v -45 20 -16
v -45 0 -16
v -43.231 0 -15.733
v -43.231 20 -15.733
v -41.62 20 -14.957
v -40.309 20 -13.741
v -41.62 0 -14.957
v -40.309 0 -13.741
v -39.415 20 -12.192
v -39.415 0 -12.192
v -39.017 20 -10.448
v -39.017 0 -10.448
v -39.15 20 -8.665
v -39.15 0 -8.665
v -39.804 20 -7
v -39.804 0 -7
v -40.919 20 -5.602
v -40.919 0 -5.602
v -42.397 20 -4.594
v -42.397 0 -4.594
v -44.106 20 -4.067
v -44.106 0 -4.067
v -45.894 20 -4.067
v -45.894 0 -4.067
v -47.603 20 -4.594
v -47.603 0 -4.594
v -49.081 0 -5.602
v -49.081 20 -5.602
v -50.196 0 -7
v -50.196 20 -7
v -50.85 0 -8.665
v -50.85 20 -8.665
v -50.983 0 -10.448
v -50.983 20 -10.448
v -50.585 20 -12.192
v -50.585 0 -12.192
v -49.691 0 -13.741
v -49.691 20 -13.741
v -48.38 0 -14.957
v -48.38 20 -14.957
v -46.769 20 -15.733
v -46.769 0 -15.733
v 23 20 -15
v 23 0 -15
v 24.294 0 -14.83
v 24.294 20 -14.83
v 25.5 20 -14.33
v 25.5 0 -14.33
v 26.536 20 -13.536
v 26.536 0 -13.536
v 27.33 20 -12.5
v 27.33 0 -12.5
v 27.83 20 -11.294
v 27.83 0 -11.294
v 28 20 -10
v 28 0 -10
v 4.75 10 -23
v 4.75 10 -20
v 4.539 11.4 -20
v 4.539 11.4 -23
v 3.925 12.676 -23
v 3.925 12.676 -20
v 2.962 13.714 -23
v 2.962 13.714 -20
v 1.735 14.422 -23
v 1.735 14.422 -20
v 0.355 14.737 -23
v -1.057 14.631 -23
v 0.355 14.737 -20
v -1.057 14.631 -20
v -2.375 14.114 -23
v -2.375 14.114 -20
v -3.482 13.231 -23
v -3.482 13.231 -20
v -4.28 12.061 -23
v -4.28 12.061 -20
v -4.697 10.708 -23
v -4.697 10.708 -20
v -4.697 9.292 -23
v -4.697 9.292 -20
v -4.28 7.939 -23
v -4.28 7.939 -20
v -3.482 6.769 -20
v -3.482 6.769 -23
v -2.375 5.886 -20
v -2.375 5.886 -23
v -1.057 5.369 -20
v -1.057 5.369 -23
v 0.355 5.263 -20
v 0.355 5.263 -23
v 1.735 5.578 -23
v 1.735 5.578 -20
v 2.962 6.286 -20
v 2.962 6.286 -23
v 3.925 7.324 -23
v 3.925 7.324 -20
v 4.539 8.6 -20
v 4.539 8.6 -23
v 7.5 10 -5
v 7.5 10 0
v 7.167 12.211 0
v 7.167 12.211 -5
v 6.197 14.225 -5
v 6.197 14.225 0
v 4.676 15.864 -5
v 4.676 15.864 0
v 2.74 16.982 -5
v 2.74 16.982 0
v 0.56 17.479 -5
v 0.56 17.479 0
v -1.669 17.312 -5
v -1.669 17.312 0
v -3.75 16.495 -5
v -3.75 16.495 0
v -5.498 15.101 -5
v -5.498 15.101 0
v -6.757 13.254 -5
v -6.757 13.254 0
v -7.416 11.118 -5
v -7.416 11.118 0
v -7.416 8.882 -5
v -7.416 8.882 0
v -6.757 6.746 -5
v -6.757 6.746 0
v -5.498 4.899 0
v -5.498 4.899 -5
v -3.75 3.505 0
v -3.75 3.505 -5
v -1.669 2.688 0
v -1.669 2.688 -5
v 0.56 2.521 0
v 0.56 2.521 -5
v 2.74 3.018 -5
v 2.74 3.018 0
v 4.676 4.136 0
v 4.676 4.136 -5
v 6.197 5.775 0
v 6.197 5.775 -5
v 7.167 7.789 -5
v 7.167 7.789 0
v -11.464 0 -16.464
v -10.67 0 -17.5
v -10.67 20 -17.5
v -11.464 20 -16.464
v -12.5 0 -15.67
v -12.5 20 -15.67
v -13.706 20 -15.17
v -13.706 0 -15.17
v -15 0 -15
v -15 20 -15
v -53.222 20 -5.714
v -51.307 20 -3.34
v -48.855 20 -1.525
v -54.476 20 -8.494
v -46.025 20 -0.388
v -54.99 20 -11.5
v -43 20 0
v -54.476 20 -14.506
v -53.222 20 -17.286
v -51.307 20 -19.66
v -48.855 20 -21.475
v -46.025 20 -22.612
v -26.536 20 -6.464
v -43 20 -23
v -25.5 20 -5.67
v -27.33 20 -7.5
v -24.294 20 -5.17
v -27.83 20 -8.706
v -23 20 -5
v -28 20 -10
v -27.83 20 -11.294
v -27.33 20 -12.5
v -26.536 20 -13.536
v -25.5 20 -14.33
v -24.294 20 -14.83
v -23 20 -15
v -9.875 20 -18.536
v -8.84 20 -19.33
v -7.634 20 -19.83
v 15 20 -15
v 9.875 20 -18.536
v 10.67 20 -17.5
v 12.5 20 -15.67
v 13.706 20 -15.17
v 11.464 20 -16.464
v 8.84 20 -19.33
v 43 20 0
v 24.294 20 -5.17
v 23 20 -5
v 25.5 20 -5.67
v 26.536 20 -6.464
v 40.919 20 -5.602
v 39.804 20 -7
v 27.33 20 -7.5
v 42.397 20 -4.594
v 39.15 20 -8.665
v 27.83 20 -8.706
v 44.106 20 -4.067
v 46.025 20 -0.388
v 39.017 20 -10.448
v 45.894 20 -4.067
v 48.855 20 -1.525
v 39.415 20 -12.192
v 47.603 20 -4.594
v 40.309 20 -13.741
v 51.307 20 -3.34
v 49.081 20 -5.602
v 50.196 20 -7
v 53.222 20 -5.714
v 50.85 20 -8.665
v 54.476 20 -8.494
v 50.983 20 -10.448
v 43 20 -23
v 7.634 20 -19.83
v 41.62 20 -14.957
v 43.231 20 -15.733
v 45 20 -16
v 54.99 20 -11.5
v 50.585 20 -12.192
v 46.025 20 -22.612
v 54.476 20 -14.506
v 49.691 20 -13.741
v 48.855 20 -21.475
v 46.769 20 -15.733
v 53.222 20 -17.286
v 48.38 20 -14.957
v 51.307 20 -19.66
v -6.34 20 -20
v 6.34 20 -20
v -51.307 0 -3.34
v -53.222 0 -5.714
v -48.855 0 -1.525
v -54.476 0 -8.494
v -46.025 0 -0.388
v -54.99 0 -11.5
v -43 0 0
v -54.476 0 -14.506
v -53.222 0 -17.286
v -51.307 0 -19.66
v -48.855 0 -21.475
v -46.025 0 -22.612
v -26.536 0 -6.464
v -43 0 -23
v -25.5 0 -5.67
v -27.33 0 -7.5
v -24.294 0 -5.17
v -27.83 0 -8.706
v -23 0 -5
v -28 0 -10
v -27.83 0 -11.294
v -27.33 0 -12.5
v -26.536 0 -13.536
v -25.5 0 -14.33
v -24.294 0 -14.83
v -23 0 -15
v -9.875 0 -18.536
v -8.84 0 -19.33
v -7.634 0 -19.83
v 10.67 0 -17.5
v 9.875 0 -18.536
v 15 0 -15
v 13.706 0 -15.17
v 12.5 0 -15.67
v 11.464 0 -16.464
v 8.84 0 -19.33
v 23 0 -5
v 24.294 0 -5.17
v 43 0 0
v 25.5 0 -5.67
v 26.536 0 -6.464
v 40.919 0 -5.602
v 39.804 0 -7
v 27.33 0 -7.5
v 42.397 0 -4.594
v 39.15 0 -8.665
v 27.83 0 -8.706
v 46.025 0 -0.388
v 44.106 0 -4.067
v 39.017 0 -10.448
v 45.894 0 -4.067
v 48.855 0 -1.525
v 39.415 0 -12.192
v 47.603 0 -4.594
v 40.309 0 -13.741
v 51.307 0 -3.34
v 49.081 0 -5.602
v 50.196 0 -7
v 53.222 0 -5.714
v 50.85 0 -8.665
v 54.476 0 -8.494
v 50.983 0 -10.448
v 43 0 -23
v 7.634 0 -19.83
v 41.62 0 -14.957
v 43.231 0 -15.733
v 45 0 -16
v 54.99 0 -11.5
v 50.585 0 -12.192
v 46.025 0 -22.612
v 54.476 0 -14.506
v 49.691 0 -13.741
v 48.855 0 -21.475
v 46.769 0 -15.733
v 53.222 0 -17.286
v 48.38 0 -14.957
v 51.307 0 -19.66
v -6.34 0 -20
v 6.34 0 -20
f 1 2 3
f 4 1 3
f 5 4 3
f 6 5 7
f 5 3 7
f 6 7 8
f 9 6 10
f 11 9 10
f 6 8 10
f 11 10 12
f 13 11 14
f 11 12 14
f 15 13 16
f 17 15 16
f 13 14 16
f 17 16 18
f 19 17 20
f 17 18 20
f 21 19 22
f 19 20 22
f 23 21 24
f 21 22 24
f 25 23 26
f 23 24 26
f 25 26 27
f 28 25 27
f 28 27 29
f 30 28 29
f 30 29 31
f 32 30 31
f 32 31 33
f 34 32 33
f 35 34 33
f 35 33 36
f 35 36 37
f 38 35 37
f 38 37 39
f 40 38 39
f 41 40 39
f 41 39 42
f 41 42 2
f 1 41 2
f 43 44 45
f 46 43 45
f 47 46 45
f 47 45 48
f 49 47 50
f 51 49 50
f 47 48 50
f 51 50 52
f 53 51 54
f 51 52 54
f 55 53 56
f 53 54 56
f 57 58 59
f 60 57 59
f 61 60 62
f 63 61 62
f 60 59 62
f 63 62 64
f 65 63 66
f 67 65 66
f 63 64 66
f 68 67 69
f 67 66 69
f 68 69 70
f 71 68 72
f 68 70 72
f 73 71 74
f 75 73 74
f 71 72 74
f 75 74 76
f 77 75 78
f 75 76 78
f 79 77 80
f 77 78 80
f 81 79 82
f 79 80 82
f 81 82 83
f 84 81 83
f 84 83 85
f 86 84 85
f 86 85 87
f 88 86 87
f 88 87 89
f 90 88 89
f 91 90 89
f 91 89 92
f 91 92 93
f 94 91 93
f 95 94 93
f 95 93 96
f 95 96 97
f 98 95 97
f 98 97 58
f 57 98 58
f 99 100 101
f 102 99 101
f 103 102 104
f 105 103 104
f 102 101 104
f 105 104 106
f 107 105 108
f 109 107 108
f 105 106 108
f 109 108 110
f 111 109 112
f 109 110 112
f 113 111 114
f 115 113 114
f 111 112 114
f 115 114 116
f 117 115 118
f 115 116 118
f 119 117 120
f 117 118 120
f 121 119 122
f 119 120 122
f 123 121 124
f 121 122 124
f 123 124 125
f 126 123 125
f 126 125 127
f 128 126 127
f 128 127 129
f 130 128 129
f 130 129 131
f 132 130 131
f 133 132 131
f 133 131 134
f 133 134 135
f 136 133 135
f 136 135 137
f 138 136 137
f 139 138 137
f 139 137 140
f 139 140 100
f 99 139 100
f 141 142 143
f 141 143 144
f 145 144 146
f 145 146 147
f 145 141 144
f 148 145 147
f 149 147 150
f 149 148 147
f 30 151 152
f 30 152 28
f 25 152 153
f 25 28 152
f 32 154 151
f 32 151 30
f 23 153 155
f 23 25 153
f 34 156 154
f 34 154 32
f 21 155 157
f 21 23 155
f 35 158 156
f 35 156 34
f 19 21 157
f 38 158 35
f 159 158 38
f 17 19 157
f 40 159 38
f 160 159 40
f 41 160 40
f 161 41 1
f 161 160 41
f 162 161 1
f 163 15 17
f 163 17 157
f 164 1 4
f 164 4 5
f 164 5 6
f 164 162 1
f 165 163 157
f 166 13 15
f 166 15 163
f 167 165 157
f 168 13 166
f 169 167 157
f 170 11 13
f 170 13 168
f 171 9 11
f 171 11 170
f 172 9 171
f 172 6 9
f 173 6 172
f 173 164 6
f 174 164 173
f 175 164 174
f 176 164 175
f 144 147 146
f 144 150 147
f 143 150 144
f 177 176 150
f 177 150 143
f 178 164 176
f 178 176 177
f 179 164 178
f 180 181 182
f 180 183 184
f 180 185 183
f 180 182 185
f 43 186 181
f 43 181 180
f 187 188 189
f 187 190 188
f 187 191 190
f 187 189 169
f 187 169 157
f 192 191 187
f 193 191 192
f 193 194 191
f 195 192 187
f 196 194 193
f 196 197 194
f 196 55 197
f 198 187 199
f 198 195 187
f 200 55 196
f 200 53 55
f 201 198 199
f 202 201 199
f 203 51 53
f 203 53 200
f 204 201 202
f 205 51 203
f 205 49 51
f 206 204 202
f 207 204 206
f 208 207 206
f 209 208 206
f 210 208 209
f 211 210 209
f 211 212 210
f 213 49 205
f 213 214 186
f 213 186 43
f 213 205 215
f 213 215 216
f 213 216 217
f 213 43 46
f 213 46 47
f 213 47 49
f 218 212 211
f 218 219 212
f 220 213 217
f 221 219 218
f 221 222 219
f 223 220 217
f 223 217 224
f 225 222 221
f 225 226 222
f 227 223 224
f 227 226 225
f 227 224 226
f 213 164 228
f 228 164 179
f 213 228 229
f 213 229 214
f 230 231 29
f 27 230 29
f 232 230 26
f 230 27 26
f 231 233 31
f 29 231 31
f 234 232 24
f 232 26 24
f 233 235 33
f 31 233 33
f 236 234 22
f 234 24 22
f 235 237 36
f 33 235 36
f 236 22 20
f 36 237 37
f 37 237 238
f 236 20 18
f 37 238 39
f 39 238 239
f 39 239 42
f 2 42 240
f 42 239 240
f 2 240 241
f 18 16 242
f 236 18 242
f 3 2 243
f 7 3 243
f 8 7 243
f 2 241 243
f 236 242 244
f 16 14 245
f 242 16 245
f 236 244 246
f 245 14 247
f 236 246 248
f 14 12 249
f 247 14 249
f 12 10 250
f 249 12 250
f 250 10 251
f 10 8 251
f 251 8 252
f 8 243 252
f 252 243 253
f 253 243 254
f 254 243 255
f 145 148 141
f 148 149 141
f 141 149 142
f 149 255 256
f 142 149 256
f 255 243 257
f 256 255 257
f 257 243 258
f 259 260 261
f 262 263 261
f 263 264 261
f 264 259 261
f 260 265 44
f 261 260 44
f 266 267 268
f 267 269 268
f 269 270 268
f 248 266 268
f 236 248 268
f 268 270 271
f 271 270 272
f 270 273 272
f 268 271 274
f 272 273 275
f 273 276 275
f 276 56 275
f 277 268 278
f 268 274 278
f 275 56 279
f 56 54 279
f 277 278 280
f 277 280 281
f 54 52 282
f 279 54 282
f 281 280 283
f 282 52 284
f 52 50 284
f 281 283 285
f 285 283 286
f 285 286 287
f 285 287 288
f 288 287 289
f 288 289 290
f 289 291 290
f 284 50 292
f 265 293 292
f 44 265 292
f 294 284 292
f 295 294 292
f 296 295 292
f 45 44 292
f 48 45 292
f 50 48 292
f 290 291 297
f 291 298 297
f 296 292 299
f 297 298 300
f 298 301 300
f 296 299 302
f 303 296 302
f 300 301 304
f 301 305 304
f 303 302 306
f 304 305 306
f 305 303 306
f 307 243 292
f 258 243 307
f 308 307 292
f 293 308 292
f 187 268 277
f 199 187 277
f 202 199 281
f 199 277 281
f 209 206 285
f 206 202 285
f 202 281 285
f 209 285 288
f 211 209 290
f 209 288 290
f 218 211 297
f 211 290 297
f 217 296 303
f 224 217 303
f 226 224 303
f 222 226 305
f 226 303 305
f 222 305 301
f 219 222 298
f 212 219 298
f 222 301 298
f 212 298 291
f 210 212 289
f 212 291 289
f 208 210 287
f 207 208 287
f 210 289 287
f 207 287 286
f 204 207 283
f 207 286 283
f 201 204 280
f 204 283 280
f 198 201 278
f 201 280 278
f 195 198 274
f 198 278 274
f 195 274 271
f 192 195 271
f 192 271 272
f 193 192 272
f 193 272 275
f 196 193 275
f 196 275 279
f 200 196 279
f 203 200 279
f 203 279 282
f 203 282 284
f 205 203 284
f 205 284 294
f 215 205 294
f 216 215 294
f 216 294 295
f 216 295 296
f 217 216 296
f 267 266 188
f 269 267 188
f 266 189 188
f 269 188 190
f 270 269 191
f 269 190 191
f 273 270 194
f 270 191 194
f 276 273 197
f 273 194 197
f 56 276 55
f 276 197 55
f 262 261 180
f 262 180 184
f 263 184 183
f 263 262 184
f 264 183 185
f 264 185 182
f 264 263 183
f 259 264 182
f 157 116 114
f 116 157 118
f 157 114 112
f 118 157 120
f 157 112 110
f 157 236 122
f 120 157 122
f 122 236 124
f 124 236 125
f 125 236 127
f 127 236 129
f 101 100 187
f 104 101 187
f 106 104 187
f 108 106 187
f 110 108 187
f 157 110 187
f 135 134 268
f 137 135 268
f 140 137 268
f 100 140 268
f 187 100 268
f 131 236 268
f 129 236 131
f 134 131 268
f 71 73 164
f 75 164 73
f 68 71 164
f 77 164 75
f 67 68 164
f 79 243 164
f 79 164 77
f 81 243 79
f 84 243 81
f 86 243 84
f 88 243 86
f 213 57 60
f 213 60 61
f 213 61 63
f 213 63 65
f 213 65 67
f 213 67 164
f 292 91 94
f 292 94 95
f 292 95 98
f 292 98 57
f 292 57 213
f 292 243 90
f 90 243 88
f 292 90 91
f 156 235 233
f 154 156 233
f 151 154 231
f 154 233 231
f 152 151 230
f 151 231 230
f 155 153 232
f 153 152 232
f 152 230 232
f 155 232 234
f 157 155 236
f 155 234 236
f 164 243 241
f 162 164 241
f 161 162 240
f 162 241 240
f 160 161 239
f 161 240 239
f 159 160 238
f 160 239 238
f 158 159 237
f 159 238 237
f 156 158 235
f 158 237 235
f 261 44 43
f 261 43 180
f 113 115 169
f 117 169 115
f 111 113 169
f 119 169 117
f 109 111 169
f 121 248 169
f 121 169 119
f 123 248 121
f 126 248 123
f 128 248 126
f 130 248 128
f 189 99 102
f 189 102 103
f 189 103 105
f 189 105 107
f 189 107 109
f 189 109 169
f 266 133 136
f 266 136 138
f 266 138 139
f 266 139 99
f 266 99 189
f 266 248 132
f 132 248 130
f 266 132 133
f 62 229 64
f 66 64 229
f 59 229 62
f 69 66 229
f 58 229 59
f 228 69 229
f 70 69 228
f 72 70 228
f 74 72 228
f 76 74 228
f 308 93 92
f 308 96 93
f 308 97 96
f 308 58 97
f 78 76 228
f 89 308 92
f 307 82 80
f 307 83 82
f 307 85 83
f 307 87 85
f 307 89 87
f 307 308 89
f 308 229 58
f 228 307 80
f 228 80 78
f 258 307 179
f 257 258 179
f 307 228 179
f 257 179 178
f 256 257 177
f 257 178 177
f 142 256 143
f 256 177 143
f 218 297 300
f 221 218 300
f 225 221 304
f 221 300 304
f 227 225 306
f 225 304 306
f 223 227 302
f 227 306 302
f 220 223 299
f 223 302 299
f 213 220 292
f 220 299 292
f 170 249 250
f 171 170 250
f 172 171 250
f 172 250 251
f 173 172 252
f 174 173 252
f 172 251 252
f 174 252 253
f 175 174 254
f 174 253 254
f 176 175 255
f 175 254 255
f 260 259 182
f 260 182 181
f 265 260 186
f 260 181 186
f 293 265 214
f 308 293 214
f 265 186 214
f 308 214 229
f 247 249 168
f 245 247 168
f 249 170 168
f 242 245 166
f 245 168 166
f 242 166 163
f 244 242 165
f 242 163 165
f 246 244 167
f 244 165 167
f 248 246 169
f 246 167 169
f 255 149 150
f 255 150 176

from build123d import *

# Parameters (mm, degrees)
BOSS_EXTRU_1_DEPTH      = 20
ENL_V_MAT_EXTRU_1_REACH = 63.847
ESQUISSE2_R             = 4.75
ENL_V_MAT_EXTRU_2_REACH = 64.881
ESQUISSE3_R             = 6
CONG_7_START            = -1
CONG_7_DEPTH            = 22
CONG_7_2_DEPTH          = 20
CONG_8_R                = 5
ENL_V_MAT_EXTRU_3_REACH = 64.881
ESQUISSE4_R             = 7.5
CONG_9_R                = 5
CONG_10_R               = 12


with BuildPart() as part:
    # Esquisse1 → Boss.-Extru.1 (new body)
    with BuildSketch(Plane(origin=(0, 0, 0), x_dir=(1, 0, 0), z_dir=(0, 1, 0))):
        Polygon((-30, 0), (-55, 0), (-55, 23), (55, 23), (55, 0), (25, 0), align=None)
        Polygon((28, 5), (28, 15), (10, 15), (10, 20), (-10, 20), (-10, 15), (-28, 15), (-28, 5), align=None, mode=Mode.SUBTRACT)
    extrude(amount=BOSS_EXTRU_1_DEPTH)

    # Esquisse2 → Enlèv. mat.-Extru.1 (cut, up to next)
    with BuildSketch(Plane.XY.offset(-20), mode=Mode.PRIVATE) as enl_v_mat_extru_1_sk1:
        with Locations((0, 10)):
            Circle(ESQUISSE2_R)
    enl_v_mat_extru_1_tool1 = extrude(enl_v_mat_extru_1_sk1.sketch, amount=-ENL_V_MAT_EXTRU_1_REACH, mode=Mode.PRIVATE) & part.part
    add(enl_v_mat_extru_1_tool1.solids().sort_by_distance((0, 10, -20))[0], mode=Mode.SUBTRACT)

    # Esquisse3 → Enlèv. mat.-Extru.2 (cut, up to next)
    with BuildSketch(Plane.XZ, mode=Mode.PRIVATE) as enl_v_mat_extru_2_sk1:
        with Locations(Location((45, -10, 0), (0, 0, 270))):
            Circle(ESQUISSE3_R)
    enl_v_mat_extru_2_tool1 = extrude(enl_v_mat_extru_2_sk1.sketch, amount=-ENL_V_MAT_EXTRU_2_REACH, mode=Mode.PRIVATE) & part.part
    # Esquisse3 → Enlèv. mat.-Extru.2 (cut, up to next)
    with BuildSketch(Plane.XZ, mode=Mode.PRIVATE) as enl_v_mat_extru_2_sk2:
        with Locations(Location((-45, -10, 0), (0, 0, 270))):
            Circle(ESQUISSE3_R)
    enl_v_mat_extru_2_tool2 = extrude(enl_v_mat_extru_2_sk2.sketch, amount=-ENL_V_MAT_EXTRU_2_REACH, mode=Mode.PRIVATE) & part.part
    add(enl_v_mat_extru_2_tool1.solids().sort_by_distance((45, 0, -10))[0], mode=Mode.SUBTRACT)
    add(enl_v_mat_extru_2_tool2.solids().sort_by_distance((-45, 0, -10))[0], mode=Mode.SUBTRACT)

    # Congé7: read off the stored shape, not the designer's step
    # Congé7 outline → Congé7 (cut)
    with BuildSketch(Plane(origin=(0, 0, 0), x_dir=(1, 0, 0), z_dir=(0, 1, 0)).offset(CONG_7_START)):
        with BuildLine():
            Line((-10, 15), (-10, 20))
            ThreePointArc((-10, 20), (-11.464466094, 16.464466094), (-15, 15))
            Line((-15, 15), (-10, 15))
        make_face()
        with BuildLine():
            Line((10, 15), (15, 15))
            ThreePointArc((15, 15), (11.464466094, 16.464466094), (10, 20))
            Line((10, 20), (10, 15))
        make_face()
    extrude(amount=CONG_7_DEPTH, mode=Mode.SUBTRACT)

    # Cong_7 2 outline → Cong_7 2 (add)
    with BuildSketch(Plane(origin=(0, 0, 0), x_dir=(1, 0, 0), z_dir=(0, 1, 0))):
        with BuildLine():
            ThreePointArc((-28, 10), (-26.535533906, 13.535533906), (-23, 15))
            Line((-23, 15), (-28, 15))
            Line((-28, 15), (-28, 10))
        make_face()
        with BuildLine():
            Line((28, 15), (23, 15))
            ThreePointArc((23, 15), (26.535533906, 13.535533906), (28, 10))
            Line((28, 10), (28, 15))
        make_face()
    extrude(amount=CONG_7_2_DEPTH)

    # Congé8
    cong_8_edges = [part.edges().sort_by_distance(p)[0] for p in [
        (-28, 10, -5),
        (28, 10, -5),
    ]]
    fillet(cong_8_edges, radius=CONG_8_R - 0.0001)  # a hair under: the kernel refuses the full size

    # Esquisse4 → Enlèv. mat.-Extru.3 (cut, up to next)
    with BuildSketch(Plane.XY, mode=Mode.PRIVATE) as enl_v_mat_extru_3_sk1:
        with Locations((0, 10)):
            Circle(ESQUISSE4_R)
    enl_v_mat_extru_3_tool1 = extrude(enl_v_mat_extru_3_sk1.sketch, amount=-ENL_V_MAT_EXTRU_3_REACH, mode=Mode.PRIVATE) & part.part
    add(enl_v_mat_extru_3_tool1.solids().sort_by_distance((0, 10, 0))[0], mode=Mode.SUBTRACT)

    # Congé9
    cong_9_edges = [part.edges().sort_by_distance(p)[0] for p in [
        (10, 10, -20),
        (-10, 10, -20),
    ]]
    fillet(cong_9_edges, radius=CONG_9_R)

    # Congé10
    # the kernel refuses this fillet: 12 mm, written as the material it takes off along each edge
    with BuildSketch(Plane(origin=(55, -30, -23), x_dir=(-1, 0, 0), z_dir=(0, 1, 0)), Plane(origin=(-55, -30, -23), x_dir=(0, 0, 1), z_dir=(0, 1, 0)), Plane(origin=(-55, -30, 0), x_dir=(1, 0, 0), z_dir=(0, 1, 0))) as cong_10_piece_1:
        with BuildLine():
            CenterArc((CONG_10_R, CONG_10_R), CONG_10_R, 180, 90)
            Line((0, CONG_10_R), (0, 0))
            Line((0, 0), (CONG_10_R, 0))
        make_face()
    extrude(amount=80, mode=Mode.SUBTRACT)
    with BuildSketch(Plane(origin=(55, -30, 0), x_dir=(-1, 0, 0), z_dir=(0, 1, 0))) as cong_10_piece_2:
        with BuildLine():
            CenterArc((CONG_10_R, -CONG_10_R), CONG_10_R, 90, 90)
            Line((0, -CONG_10_R), (0, 0))
            Line((0, 0), (CONG_10_R, 0))
        make_face()
    extrude(amount=80, mode=Mode.SUBTRACT)


solid = part.part
